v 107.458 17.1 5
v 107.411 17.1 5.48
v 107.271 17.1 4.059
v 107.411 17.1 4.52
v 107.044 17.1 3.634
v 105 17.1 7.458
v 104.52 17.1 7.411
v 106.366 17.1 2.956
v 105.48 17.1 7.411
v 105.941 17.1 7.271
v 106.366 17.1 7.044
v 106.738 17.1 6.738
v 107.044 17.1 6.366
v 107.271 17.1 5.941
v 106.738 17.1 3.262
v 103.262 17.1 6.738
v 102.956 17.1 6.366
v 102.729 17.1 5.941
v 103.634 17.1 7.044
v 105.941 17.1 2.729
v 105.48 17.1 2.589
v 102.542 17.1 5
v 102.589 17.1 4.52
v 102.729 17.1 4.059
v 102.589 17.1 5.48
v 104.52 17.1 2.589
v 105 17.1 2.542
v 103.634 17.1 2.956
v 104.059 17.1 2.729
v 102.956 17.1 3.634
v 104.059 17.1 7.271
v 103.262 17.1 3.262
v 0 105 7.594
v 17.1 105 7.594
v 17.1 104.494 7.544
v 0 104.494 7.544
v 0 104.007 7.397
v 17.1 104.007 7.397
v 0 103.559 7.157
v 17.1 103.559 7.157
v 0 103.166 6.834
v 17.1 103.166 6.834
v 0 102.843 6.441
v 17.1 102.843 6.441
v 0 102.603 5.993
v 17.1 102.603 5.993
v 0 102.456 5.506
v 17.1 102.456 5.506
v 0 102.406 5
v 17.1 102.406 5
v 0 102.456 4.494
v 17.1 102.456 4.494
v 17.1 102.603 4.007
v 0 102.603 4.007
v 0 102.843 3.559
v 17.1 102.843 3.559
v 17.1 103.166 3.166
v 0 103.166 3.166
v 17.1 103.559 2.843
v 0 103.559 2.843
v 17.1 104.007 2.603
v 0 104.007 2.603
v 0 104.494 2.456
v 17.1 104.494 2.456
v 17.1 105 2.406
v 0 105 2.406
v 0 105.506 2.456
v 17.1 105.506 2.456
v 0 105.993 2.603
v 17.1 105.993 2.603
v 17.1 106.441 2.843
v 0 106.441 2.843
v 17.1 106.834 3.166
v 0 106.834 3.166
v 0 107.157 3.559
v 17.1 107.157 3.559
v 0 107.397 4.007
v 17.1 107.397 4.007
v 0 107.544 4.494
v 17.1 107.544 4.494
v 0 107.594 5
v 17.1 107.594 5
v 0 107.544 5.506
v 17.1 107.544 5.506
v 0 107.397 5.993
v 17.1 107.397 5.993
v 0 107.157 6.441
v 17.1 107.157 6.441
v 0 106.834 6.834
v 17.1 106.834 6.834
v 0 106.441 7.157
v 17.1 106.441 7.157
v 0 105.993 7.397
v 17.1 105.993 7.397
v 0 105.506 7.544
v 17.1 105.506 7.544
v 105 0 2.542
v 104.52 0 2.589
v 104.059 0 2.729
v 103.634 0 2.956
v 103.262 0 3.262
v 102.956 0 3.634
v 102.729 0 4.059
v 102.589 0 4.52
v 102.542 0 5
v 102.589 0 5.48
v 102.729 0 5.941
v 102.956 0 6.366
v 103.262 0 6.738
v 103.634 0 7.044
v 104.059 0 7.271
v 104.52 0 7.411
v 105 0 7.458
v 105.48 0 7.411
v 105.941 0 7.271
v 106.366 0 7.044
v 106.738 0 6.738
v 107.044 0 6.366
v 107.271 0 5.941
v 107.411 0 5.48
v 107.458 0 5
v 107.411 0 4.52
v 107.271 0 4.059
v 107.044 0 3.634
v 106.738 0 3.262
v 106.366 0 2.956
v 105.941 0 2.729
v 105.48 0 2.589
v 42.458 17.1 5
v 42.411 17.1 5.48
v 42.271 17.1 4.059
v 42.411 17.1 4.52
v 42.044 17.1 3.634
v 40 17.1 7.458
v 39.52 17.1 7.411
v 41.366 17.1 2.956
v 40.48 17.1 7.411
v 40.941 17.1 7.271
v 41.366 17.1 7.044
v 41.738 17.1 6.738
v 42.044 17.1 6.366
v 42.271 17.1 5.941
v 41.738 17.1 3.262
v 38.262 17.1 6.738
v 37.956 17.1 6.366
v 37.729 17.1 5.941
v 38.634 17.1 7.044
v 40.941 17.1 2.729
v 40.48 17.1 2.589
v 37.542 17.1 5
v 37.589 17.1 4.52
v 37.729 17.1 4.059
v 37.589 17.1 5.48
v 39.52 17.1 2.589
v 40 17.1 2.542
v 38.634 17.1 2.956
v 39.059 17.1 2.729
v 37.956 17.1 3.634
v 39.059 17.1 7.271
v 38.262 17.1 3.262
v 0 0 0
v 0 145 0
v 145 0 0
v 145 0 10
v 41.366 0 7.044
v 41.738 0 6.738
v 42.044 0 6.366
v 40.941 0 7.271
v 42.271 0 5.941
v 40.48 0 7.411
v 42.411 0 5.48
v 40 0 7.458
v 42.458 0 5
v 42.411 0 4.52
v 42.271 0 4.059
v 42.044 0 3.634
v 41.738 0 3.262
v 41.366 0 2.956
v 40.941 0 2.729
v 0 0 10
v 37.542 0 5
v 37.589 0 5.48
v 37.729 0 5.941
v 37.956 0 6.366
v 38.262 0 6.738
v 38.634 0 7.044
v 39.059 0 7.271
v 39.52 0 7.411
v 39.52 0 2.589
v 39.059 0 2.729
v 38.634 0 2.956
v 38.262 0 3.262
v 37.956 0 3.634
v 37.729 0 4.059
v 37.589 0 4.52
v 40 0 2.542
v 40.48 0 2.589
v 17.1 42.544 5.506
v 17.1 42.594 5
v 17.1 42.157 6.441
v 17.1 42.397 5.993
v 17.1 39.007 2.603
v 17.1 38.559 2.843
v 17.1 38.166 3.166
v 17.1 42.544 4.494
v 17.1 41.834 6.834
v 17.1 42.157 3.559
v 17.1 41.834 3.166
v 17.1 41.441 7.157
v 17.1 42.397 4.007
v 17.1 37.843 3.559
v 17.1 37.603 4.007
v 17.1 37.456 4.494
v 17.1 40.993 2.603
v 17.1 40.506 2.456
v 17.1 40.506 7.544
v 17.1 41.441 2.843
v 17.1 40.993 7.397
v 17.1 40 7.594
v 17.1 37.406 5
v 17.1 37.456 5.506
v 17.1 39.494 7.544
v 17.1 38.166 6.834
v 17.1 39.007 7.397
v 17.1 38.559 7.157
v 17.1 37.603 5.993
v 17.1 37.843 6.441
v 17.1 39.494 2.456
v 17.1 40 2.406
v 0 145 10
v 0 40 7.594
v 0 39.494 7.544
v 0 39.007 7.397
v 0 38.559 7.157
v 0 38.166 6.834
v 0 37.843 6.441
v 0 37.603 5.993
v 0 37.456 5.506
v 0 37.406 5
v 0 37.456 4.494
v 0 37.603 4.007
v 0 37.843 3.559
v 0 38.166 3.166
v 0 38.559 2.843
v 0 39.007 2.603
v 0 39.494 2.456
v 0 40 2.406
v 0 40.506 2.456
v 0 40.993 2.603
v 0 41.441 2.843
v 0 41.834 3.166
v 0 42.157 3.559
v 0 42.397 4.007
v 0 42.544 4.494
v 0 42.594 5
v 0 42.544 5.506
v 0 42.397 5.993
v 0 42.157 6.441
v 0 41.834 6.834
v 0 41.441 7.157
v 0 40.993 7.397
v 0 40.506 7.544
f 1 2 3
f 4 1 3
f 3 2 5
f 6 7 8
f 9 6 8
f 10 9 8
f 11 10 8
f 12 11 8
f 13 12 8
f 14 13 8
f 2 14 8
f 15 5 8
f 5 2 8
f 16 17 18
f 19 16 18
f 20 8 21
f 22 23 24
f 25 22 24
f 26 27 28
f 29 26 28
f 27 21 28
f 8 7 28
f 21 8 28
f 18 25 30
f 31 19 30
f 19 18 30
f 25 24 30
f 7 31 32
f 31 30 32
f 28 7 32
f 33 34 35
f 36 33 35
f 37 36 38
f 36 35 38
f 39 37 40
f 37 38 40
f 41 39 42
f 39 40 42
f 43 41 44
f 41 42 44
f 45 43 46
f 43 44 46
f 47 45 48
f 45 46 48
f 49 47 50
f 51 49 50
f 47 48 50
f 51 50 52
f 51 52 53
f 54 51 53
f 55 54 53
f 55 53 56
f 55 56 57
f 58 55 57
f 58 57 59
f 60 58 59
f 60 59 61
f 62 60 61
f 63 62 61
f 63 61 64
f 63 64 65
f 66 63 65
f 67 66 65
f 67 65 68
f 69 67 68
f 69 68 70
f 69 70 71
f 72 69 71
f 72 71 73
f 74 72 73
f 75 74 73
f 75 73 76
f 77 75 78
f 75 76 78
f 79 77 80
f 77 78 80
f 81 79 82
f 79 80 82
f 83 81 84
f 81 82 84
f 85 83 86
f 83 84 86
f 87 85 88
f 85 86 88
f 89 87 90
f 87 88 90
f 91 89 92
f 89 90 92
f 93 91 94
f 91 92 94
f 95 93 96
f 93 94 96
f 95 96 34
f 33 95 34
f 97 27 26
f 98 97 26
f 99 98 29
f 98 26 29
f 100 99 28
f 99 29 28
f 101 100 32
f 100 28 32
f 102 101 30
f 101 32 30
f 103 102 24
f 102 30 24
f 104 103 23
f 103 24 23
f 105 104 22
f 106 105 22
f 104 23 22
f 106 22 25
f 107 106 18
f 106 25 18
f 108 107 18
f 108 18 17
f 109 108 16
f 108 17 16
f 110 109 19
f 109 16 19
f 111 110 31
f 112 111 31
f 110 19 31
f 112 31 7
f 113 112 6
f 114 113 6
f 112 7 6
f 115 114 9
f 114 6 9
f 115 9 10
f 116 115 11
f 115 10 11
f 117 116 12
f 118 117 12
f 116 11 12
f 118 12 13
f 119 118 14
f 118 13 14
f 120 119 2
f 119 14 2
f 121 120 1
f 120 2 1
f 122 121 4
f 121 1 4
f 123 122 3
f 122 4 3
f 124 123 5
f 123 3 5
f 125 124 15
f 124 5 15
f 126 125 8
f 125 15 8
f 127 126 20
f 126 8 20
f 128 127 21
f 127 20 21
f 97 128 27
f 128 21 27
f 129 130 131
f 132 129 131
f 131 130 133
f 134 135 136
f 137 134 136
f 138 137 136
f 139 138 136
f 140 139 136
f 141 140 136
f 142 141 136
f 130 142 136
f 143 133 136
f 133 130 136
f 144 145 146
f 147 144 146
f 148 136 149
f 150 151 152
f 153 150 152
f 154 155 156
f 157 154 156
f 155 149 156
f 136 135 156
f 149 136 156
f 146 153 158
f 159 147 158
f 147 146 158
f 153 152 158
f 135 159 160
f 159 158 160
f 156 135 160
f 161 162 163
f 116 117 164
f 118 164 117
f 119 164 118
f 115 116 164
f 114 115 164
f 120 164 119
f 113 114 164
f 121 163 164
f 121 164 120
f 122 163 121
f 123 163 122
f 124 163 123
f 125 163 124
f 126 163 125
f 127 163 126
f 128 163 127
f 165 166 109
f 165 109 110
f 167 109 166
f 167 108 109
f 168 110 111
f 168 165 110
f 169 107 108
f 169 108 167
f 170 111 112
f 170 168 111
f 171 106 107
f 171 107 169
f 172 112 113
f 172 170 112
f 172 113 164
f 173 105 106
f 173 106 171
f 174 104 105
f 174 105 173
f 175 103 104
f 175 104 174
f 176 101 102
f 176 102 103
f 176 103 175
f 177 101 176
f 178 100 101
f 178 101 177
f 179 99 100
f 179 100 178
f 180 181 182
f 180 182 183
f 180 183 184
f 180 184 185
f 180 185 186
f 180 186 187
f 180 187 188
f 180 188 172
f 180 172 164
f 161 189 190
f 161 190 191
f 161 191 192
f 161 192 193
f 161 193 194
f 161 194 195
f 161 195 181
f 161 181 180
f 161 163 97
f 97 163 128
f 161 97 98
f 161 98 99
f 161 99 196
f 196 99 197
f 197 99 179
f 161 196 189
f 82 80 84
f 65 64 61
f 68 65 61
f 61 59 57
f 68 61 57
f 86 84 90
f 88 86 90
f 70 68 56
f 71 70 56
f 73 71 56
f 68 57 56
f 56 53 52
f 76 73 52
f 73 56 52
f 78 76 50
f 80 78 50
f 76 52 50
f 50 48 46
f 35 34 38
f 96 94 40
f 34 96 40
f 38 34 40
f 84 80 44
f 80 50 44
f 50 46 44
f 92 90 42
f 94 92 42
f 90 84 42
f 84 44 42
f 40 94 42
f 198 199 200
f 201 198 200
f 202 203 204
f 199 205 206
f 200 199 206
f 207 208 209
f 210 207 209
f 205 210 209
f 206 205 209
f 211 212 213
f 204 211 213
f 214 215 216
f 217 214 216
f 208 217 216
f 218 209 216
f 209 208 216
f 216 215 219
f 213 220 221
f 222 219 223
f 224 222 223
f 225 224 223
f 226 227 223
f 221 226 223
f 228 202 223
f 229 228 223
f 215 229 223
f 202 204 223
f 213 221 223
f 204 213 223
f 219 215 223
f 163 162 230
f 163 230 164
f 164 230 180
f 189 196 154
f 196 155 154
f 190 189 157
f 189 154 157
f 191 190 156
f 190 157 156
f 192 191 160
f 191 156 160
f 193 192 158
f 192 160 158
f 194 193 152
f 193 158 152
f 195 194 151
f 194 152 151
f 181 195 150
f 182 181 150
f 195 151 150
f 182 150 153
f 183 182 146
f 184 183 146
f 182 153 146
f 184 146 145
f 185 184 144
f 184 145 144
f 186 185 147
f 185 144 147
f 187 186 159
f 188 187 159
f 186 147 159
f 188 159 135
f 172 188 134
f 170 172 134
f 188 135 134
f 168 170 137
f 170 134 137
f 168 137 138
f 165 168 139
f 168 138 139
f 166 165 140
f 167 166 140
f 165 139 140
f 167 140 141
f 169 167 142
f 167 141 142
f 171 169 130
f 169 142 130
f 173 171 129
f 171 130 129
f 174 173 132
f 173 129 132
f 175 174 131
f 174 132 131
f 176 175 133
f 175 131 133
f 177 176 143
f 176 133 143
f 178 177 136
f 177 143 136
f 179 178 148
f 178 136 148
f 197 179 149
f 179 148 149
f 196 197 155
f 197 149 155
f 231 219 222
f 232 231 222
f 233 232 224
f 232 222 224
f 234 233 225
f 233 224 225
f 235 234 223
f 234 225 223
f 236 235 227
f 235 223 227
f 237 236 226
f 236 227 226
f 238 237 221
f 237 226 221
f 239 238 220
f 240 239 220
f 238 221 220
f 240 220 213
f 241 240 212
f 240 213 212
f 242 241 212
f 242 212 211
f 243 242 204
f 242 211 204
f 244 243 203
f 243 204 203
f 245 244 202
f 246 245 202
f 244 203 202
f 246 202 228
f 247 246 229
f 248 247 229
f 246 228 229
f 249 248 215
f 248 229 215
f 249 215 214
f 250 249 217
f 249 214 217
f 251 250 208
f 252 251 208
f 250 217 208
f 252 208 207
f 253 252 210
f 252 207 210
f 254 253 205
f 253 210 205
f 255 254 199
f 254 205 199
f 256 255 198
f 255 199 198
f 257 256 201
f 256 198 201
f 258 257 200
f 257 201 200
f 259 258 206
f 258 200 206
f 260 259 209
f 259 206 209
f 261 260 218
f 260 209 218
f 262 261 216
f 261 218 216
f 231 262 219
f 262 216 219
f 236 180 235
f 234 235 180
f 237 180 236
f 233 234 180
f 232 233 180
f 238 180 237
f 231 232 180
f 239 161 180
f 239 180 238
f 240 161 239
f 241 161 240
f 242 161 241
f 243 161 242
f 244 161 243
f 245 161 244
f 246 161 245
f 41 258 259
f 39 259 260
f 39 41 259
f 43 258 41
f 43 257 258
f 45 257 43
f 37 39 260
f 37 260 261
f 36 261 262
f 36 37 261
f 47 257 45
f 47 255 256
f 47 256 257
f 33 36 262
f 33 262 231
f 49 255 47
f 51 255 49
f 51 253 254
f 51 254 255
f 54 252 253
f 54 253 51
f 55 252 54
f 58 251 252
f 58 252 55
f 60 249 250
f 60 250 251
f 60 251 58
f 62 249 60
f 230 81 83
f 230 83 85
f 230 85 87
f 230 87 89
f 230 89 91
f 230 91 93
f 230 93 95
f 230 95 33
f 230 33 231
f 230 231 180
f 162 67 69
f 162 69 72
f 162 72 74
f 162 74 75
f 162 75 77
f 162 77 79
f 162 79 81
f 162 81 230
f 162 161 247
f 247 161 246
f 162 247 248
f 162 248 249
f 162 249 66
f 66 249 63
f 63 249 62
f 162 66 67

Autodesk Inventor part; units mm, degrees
ref_plane "YZ Plane" through (0, 0, 0) normal (1, 0, 0) x (0, 1, 0)
ref_plane "XZ Plane" through (0, 0, 0) normal (0, 1, 0) x (-1, 0, 0)
ref_plane "XY Plane" through (0, 0, 0) normal (0, 0, 1) x (1, 0, 0)
sketch "Sketch1" plane through (0, 0, 0) normal (0, 0, 1) x (1, 0, 0)
  line L0 (0, 0) -> (0, 145)
  line L1 (0, 145) -> (145, 0)
  line L2 (145, 0) -> (0, 0)
  dimension "d0" = 145
  dimension "d1" = 145
extrude "Extrusion1" add sketch "Sketch1" along normal blind 10
sketch "Sketch2" plane through (0, 0, 0) normal (0, -1, 0) x (1, 0, 0)
  line L0 (145, 0) -> (145, 10) projected
  line L1 (145, 5) -> (0, 5)
  circle A0 centre (105, 5) radius 3
  circle A1 centre (40, 5) radius 3
  line L2 (0, 0) -> (0, 10) projected
  dimension "d4" = 6
  dimension "d5" = 6
  dimension "d6" = 40
  dimension "d7" = 40
hole "Hole1" at (105, 0, 5) at (40, 0, 5) direction (0, 1, 0) diameter 4.917 depth 17.1 thread size "M6x1" class "6H" standard "ISO Metric profile"
sketch "Sketch3" plane through (0, 0, 0) normal (-1, 0, 0) x (0, 0, 1)
  line L0 (0, 145) -> (10, 145) projected
  line L1 (5, 145) -> (5, 0)
  line L2 (0, 0) -> (10, 0) projected
  circle A0 centre (5, 105) radius 3
  circle A1 centre (5, 40) radius 3
  dimension "d15" = 6
  dimension "d16" = 6
  dimension "d17" = 40
  dimension "d18" = 40
hole "Hole2" at (0, 105, 5) at (0, 40, 5) direction (1, 0, 0) diameter 5.1881 depth 17.1 thread size "M6x0.75" class "6H" standard "ISO Metric profile"
sketch "Sketch4" plane through (0, 0, 0) normal (-1, 0, 0) x (0, 0, 1)
  point P0 (0, 0)
properties part number "145x145(li)"
